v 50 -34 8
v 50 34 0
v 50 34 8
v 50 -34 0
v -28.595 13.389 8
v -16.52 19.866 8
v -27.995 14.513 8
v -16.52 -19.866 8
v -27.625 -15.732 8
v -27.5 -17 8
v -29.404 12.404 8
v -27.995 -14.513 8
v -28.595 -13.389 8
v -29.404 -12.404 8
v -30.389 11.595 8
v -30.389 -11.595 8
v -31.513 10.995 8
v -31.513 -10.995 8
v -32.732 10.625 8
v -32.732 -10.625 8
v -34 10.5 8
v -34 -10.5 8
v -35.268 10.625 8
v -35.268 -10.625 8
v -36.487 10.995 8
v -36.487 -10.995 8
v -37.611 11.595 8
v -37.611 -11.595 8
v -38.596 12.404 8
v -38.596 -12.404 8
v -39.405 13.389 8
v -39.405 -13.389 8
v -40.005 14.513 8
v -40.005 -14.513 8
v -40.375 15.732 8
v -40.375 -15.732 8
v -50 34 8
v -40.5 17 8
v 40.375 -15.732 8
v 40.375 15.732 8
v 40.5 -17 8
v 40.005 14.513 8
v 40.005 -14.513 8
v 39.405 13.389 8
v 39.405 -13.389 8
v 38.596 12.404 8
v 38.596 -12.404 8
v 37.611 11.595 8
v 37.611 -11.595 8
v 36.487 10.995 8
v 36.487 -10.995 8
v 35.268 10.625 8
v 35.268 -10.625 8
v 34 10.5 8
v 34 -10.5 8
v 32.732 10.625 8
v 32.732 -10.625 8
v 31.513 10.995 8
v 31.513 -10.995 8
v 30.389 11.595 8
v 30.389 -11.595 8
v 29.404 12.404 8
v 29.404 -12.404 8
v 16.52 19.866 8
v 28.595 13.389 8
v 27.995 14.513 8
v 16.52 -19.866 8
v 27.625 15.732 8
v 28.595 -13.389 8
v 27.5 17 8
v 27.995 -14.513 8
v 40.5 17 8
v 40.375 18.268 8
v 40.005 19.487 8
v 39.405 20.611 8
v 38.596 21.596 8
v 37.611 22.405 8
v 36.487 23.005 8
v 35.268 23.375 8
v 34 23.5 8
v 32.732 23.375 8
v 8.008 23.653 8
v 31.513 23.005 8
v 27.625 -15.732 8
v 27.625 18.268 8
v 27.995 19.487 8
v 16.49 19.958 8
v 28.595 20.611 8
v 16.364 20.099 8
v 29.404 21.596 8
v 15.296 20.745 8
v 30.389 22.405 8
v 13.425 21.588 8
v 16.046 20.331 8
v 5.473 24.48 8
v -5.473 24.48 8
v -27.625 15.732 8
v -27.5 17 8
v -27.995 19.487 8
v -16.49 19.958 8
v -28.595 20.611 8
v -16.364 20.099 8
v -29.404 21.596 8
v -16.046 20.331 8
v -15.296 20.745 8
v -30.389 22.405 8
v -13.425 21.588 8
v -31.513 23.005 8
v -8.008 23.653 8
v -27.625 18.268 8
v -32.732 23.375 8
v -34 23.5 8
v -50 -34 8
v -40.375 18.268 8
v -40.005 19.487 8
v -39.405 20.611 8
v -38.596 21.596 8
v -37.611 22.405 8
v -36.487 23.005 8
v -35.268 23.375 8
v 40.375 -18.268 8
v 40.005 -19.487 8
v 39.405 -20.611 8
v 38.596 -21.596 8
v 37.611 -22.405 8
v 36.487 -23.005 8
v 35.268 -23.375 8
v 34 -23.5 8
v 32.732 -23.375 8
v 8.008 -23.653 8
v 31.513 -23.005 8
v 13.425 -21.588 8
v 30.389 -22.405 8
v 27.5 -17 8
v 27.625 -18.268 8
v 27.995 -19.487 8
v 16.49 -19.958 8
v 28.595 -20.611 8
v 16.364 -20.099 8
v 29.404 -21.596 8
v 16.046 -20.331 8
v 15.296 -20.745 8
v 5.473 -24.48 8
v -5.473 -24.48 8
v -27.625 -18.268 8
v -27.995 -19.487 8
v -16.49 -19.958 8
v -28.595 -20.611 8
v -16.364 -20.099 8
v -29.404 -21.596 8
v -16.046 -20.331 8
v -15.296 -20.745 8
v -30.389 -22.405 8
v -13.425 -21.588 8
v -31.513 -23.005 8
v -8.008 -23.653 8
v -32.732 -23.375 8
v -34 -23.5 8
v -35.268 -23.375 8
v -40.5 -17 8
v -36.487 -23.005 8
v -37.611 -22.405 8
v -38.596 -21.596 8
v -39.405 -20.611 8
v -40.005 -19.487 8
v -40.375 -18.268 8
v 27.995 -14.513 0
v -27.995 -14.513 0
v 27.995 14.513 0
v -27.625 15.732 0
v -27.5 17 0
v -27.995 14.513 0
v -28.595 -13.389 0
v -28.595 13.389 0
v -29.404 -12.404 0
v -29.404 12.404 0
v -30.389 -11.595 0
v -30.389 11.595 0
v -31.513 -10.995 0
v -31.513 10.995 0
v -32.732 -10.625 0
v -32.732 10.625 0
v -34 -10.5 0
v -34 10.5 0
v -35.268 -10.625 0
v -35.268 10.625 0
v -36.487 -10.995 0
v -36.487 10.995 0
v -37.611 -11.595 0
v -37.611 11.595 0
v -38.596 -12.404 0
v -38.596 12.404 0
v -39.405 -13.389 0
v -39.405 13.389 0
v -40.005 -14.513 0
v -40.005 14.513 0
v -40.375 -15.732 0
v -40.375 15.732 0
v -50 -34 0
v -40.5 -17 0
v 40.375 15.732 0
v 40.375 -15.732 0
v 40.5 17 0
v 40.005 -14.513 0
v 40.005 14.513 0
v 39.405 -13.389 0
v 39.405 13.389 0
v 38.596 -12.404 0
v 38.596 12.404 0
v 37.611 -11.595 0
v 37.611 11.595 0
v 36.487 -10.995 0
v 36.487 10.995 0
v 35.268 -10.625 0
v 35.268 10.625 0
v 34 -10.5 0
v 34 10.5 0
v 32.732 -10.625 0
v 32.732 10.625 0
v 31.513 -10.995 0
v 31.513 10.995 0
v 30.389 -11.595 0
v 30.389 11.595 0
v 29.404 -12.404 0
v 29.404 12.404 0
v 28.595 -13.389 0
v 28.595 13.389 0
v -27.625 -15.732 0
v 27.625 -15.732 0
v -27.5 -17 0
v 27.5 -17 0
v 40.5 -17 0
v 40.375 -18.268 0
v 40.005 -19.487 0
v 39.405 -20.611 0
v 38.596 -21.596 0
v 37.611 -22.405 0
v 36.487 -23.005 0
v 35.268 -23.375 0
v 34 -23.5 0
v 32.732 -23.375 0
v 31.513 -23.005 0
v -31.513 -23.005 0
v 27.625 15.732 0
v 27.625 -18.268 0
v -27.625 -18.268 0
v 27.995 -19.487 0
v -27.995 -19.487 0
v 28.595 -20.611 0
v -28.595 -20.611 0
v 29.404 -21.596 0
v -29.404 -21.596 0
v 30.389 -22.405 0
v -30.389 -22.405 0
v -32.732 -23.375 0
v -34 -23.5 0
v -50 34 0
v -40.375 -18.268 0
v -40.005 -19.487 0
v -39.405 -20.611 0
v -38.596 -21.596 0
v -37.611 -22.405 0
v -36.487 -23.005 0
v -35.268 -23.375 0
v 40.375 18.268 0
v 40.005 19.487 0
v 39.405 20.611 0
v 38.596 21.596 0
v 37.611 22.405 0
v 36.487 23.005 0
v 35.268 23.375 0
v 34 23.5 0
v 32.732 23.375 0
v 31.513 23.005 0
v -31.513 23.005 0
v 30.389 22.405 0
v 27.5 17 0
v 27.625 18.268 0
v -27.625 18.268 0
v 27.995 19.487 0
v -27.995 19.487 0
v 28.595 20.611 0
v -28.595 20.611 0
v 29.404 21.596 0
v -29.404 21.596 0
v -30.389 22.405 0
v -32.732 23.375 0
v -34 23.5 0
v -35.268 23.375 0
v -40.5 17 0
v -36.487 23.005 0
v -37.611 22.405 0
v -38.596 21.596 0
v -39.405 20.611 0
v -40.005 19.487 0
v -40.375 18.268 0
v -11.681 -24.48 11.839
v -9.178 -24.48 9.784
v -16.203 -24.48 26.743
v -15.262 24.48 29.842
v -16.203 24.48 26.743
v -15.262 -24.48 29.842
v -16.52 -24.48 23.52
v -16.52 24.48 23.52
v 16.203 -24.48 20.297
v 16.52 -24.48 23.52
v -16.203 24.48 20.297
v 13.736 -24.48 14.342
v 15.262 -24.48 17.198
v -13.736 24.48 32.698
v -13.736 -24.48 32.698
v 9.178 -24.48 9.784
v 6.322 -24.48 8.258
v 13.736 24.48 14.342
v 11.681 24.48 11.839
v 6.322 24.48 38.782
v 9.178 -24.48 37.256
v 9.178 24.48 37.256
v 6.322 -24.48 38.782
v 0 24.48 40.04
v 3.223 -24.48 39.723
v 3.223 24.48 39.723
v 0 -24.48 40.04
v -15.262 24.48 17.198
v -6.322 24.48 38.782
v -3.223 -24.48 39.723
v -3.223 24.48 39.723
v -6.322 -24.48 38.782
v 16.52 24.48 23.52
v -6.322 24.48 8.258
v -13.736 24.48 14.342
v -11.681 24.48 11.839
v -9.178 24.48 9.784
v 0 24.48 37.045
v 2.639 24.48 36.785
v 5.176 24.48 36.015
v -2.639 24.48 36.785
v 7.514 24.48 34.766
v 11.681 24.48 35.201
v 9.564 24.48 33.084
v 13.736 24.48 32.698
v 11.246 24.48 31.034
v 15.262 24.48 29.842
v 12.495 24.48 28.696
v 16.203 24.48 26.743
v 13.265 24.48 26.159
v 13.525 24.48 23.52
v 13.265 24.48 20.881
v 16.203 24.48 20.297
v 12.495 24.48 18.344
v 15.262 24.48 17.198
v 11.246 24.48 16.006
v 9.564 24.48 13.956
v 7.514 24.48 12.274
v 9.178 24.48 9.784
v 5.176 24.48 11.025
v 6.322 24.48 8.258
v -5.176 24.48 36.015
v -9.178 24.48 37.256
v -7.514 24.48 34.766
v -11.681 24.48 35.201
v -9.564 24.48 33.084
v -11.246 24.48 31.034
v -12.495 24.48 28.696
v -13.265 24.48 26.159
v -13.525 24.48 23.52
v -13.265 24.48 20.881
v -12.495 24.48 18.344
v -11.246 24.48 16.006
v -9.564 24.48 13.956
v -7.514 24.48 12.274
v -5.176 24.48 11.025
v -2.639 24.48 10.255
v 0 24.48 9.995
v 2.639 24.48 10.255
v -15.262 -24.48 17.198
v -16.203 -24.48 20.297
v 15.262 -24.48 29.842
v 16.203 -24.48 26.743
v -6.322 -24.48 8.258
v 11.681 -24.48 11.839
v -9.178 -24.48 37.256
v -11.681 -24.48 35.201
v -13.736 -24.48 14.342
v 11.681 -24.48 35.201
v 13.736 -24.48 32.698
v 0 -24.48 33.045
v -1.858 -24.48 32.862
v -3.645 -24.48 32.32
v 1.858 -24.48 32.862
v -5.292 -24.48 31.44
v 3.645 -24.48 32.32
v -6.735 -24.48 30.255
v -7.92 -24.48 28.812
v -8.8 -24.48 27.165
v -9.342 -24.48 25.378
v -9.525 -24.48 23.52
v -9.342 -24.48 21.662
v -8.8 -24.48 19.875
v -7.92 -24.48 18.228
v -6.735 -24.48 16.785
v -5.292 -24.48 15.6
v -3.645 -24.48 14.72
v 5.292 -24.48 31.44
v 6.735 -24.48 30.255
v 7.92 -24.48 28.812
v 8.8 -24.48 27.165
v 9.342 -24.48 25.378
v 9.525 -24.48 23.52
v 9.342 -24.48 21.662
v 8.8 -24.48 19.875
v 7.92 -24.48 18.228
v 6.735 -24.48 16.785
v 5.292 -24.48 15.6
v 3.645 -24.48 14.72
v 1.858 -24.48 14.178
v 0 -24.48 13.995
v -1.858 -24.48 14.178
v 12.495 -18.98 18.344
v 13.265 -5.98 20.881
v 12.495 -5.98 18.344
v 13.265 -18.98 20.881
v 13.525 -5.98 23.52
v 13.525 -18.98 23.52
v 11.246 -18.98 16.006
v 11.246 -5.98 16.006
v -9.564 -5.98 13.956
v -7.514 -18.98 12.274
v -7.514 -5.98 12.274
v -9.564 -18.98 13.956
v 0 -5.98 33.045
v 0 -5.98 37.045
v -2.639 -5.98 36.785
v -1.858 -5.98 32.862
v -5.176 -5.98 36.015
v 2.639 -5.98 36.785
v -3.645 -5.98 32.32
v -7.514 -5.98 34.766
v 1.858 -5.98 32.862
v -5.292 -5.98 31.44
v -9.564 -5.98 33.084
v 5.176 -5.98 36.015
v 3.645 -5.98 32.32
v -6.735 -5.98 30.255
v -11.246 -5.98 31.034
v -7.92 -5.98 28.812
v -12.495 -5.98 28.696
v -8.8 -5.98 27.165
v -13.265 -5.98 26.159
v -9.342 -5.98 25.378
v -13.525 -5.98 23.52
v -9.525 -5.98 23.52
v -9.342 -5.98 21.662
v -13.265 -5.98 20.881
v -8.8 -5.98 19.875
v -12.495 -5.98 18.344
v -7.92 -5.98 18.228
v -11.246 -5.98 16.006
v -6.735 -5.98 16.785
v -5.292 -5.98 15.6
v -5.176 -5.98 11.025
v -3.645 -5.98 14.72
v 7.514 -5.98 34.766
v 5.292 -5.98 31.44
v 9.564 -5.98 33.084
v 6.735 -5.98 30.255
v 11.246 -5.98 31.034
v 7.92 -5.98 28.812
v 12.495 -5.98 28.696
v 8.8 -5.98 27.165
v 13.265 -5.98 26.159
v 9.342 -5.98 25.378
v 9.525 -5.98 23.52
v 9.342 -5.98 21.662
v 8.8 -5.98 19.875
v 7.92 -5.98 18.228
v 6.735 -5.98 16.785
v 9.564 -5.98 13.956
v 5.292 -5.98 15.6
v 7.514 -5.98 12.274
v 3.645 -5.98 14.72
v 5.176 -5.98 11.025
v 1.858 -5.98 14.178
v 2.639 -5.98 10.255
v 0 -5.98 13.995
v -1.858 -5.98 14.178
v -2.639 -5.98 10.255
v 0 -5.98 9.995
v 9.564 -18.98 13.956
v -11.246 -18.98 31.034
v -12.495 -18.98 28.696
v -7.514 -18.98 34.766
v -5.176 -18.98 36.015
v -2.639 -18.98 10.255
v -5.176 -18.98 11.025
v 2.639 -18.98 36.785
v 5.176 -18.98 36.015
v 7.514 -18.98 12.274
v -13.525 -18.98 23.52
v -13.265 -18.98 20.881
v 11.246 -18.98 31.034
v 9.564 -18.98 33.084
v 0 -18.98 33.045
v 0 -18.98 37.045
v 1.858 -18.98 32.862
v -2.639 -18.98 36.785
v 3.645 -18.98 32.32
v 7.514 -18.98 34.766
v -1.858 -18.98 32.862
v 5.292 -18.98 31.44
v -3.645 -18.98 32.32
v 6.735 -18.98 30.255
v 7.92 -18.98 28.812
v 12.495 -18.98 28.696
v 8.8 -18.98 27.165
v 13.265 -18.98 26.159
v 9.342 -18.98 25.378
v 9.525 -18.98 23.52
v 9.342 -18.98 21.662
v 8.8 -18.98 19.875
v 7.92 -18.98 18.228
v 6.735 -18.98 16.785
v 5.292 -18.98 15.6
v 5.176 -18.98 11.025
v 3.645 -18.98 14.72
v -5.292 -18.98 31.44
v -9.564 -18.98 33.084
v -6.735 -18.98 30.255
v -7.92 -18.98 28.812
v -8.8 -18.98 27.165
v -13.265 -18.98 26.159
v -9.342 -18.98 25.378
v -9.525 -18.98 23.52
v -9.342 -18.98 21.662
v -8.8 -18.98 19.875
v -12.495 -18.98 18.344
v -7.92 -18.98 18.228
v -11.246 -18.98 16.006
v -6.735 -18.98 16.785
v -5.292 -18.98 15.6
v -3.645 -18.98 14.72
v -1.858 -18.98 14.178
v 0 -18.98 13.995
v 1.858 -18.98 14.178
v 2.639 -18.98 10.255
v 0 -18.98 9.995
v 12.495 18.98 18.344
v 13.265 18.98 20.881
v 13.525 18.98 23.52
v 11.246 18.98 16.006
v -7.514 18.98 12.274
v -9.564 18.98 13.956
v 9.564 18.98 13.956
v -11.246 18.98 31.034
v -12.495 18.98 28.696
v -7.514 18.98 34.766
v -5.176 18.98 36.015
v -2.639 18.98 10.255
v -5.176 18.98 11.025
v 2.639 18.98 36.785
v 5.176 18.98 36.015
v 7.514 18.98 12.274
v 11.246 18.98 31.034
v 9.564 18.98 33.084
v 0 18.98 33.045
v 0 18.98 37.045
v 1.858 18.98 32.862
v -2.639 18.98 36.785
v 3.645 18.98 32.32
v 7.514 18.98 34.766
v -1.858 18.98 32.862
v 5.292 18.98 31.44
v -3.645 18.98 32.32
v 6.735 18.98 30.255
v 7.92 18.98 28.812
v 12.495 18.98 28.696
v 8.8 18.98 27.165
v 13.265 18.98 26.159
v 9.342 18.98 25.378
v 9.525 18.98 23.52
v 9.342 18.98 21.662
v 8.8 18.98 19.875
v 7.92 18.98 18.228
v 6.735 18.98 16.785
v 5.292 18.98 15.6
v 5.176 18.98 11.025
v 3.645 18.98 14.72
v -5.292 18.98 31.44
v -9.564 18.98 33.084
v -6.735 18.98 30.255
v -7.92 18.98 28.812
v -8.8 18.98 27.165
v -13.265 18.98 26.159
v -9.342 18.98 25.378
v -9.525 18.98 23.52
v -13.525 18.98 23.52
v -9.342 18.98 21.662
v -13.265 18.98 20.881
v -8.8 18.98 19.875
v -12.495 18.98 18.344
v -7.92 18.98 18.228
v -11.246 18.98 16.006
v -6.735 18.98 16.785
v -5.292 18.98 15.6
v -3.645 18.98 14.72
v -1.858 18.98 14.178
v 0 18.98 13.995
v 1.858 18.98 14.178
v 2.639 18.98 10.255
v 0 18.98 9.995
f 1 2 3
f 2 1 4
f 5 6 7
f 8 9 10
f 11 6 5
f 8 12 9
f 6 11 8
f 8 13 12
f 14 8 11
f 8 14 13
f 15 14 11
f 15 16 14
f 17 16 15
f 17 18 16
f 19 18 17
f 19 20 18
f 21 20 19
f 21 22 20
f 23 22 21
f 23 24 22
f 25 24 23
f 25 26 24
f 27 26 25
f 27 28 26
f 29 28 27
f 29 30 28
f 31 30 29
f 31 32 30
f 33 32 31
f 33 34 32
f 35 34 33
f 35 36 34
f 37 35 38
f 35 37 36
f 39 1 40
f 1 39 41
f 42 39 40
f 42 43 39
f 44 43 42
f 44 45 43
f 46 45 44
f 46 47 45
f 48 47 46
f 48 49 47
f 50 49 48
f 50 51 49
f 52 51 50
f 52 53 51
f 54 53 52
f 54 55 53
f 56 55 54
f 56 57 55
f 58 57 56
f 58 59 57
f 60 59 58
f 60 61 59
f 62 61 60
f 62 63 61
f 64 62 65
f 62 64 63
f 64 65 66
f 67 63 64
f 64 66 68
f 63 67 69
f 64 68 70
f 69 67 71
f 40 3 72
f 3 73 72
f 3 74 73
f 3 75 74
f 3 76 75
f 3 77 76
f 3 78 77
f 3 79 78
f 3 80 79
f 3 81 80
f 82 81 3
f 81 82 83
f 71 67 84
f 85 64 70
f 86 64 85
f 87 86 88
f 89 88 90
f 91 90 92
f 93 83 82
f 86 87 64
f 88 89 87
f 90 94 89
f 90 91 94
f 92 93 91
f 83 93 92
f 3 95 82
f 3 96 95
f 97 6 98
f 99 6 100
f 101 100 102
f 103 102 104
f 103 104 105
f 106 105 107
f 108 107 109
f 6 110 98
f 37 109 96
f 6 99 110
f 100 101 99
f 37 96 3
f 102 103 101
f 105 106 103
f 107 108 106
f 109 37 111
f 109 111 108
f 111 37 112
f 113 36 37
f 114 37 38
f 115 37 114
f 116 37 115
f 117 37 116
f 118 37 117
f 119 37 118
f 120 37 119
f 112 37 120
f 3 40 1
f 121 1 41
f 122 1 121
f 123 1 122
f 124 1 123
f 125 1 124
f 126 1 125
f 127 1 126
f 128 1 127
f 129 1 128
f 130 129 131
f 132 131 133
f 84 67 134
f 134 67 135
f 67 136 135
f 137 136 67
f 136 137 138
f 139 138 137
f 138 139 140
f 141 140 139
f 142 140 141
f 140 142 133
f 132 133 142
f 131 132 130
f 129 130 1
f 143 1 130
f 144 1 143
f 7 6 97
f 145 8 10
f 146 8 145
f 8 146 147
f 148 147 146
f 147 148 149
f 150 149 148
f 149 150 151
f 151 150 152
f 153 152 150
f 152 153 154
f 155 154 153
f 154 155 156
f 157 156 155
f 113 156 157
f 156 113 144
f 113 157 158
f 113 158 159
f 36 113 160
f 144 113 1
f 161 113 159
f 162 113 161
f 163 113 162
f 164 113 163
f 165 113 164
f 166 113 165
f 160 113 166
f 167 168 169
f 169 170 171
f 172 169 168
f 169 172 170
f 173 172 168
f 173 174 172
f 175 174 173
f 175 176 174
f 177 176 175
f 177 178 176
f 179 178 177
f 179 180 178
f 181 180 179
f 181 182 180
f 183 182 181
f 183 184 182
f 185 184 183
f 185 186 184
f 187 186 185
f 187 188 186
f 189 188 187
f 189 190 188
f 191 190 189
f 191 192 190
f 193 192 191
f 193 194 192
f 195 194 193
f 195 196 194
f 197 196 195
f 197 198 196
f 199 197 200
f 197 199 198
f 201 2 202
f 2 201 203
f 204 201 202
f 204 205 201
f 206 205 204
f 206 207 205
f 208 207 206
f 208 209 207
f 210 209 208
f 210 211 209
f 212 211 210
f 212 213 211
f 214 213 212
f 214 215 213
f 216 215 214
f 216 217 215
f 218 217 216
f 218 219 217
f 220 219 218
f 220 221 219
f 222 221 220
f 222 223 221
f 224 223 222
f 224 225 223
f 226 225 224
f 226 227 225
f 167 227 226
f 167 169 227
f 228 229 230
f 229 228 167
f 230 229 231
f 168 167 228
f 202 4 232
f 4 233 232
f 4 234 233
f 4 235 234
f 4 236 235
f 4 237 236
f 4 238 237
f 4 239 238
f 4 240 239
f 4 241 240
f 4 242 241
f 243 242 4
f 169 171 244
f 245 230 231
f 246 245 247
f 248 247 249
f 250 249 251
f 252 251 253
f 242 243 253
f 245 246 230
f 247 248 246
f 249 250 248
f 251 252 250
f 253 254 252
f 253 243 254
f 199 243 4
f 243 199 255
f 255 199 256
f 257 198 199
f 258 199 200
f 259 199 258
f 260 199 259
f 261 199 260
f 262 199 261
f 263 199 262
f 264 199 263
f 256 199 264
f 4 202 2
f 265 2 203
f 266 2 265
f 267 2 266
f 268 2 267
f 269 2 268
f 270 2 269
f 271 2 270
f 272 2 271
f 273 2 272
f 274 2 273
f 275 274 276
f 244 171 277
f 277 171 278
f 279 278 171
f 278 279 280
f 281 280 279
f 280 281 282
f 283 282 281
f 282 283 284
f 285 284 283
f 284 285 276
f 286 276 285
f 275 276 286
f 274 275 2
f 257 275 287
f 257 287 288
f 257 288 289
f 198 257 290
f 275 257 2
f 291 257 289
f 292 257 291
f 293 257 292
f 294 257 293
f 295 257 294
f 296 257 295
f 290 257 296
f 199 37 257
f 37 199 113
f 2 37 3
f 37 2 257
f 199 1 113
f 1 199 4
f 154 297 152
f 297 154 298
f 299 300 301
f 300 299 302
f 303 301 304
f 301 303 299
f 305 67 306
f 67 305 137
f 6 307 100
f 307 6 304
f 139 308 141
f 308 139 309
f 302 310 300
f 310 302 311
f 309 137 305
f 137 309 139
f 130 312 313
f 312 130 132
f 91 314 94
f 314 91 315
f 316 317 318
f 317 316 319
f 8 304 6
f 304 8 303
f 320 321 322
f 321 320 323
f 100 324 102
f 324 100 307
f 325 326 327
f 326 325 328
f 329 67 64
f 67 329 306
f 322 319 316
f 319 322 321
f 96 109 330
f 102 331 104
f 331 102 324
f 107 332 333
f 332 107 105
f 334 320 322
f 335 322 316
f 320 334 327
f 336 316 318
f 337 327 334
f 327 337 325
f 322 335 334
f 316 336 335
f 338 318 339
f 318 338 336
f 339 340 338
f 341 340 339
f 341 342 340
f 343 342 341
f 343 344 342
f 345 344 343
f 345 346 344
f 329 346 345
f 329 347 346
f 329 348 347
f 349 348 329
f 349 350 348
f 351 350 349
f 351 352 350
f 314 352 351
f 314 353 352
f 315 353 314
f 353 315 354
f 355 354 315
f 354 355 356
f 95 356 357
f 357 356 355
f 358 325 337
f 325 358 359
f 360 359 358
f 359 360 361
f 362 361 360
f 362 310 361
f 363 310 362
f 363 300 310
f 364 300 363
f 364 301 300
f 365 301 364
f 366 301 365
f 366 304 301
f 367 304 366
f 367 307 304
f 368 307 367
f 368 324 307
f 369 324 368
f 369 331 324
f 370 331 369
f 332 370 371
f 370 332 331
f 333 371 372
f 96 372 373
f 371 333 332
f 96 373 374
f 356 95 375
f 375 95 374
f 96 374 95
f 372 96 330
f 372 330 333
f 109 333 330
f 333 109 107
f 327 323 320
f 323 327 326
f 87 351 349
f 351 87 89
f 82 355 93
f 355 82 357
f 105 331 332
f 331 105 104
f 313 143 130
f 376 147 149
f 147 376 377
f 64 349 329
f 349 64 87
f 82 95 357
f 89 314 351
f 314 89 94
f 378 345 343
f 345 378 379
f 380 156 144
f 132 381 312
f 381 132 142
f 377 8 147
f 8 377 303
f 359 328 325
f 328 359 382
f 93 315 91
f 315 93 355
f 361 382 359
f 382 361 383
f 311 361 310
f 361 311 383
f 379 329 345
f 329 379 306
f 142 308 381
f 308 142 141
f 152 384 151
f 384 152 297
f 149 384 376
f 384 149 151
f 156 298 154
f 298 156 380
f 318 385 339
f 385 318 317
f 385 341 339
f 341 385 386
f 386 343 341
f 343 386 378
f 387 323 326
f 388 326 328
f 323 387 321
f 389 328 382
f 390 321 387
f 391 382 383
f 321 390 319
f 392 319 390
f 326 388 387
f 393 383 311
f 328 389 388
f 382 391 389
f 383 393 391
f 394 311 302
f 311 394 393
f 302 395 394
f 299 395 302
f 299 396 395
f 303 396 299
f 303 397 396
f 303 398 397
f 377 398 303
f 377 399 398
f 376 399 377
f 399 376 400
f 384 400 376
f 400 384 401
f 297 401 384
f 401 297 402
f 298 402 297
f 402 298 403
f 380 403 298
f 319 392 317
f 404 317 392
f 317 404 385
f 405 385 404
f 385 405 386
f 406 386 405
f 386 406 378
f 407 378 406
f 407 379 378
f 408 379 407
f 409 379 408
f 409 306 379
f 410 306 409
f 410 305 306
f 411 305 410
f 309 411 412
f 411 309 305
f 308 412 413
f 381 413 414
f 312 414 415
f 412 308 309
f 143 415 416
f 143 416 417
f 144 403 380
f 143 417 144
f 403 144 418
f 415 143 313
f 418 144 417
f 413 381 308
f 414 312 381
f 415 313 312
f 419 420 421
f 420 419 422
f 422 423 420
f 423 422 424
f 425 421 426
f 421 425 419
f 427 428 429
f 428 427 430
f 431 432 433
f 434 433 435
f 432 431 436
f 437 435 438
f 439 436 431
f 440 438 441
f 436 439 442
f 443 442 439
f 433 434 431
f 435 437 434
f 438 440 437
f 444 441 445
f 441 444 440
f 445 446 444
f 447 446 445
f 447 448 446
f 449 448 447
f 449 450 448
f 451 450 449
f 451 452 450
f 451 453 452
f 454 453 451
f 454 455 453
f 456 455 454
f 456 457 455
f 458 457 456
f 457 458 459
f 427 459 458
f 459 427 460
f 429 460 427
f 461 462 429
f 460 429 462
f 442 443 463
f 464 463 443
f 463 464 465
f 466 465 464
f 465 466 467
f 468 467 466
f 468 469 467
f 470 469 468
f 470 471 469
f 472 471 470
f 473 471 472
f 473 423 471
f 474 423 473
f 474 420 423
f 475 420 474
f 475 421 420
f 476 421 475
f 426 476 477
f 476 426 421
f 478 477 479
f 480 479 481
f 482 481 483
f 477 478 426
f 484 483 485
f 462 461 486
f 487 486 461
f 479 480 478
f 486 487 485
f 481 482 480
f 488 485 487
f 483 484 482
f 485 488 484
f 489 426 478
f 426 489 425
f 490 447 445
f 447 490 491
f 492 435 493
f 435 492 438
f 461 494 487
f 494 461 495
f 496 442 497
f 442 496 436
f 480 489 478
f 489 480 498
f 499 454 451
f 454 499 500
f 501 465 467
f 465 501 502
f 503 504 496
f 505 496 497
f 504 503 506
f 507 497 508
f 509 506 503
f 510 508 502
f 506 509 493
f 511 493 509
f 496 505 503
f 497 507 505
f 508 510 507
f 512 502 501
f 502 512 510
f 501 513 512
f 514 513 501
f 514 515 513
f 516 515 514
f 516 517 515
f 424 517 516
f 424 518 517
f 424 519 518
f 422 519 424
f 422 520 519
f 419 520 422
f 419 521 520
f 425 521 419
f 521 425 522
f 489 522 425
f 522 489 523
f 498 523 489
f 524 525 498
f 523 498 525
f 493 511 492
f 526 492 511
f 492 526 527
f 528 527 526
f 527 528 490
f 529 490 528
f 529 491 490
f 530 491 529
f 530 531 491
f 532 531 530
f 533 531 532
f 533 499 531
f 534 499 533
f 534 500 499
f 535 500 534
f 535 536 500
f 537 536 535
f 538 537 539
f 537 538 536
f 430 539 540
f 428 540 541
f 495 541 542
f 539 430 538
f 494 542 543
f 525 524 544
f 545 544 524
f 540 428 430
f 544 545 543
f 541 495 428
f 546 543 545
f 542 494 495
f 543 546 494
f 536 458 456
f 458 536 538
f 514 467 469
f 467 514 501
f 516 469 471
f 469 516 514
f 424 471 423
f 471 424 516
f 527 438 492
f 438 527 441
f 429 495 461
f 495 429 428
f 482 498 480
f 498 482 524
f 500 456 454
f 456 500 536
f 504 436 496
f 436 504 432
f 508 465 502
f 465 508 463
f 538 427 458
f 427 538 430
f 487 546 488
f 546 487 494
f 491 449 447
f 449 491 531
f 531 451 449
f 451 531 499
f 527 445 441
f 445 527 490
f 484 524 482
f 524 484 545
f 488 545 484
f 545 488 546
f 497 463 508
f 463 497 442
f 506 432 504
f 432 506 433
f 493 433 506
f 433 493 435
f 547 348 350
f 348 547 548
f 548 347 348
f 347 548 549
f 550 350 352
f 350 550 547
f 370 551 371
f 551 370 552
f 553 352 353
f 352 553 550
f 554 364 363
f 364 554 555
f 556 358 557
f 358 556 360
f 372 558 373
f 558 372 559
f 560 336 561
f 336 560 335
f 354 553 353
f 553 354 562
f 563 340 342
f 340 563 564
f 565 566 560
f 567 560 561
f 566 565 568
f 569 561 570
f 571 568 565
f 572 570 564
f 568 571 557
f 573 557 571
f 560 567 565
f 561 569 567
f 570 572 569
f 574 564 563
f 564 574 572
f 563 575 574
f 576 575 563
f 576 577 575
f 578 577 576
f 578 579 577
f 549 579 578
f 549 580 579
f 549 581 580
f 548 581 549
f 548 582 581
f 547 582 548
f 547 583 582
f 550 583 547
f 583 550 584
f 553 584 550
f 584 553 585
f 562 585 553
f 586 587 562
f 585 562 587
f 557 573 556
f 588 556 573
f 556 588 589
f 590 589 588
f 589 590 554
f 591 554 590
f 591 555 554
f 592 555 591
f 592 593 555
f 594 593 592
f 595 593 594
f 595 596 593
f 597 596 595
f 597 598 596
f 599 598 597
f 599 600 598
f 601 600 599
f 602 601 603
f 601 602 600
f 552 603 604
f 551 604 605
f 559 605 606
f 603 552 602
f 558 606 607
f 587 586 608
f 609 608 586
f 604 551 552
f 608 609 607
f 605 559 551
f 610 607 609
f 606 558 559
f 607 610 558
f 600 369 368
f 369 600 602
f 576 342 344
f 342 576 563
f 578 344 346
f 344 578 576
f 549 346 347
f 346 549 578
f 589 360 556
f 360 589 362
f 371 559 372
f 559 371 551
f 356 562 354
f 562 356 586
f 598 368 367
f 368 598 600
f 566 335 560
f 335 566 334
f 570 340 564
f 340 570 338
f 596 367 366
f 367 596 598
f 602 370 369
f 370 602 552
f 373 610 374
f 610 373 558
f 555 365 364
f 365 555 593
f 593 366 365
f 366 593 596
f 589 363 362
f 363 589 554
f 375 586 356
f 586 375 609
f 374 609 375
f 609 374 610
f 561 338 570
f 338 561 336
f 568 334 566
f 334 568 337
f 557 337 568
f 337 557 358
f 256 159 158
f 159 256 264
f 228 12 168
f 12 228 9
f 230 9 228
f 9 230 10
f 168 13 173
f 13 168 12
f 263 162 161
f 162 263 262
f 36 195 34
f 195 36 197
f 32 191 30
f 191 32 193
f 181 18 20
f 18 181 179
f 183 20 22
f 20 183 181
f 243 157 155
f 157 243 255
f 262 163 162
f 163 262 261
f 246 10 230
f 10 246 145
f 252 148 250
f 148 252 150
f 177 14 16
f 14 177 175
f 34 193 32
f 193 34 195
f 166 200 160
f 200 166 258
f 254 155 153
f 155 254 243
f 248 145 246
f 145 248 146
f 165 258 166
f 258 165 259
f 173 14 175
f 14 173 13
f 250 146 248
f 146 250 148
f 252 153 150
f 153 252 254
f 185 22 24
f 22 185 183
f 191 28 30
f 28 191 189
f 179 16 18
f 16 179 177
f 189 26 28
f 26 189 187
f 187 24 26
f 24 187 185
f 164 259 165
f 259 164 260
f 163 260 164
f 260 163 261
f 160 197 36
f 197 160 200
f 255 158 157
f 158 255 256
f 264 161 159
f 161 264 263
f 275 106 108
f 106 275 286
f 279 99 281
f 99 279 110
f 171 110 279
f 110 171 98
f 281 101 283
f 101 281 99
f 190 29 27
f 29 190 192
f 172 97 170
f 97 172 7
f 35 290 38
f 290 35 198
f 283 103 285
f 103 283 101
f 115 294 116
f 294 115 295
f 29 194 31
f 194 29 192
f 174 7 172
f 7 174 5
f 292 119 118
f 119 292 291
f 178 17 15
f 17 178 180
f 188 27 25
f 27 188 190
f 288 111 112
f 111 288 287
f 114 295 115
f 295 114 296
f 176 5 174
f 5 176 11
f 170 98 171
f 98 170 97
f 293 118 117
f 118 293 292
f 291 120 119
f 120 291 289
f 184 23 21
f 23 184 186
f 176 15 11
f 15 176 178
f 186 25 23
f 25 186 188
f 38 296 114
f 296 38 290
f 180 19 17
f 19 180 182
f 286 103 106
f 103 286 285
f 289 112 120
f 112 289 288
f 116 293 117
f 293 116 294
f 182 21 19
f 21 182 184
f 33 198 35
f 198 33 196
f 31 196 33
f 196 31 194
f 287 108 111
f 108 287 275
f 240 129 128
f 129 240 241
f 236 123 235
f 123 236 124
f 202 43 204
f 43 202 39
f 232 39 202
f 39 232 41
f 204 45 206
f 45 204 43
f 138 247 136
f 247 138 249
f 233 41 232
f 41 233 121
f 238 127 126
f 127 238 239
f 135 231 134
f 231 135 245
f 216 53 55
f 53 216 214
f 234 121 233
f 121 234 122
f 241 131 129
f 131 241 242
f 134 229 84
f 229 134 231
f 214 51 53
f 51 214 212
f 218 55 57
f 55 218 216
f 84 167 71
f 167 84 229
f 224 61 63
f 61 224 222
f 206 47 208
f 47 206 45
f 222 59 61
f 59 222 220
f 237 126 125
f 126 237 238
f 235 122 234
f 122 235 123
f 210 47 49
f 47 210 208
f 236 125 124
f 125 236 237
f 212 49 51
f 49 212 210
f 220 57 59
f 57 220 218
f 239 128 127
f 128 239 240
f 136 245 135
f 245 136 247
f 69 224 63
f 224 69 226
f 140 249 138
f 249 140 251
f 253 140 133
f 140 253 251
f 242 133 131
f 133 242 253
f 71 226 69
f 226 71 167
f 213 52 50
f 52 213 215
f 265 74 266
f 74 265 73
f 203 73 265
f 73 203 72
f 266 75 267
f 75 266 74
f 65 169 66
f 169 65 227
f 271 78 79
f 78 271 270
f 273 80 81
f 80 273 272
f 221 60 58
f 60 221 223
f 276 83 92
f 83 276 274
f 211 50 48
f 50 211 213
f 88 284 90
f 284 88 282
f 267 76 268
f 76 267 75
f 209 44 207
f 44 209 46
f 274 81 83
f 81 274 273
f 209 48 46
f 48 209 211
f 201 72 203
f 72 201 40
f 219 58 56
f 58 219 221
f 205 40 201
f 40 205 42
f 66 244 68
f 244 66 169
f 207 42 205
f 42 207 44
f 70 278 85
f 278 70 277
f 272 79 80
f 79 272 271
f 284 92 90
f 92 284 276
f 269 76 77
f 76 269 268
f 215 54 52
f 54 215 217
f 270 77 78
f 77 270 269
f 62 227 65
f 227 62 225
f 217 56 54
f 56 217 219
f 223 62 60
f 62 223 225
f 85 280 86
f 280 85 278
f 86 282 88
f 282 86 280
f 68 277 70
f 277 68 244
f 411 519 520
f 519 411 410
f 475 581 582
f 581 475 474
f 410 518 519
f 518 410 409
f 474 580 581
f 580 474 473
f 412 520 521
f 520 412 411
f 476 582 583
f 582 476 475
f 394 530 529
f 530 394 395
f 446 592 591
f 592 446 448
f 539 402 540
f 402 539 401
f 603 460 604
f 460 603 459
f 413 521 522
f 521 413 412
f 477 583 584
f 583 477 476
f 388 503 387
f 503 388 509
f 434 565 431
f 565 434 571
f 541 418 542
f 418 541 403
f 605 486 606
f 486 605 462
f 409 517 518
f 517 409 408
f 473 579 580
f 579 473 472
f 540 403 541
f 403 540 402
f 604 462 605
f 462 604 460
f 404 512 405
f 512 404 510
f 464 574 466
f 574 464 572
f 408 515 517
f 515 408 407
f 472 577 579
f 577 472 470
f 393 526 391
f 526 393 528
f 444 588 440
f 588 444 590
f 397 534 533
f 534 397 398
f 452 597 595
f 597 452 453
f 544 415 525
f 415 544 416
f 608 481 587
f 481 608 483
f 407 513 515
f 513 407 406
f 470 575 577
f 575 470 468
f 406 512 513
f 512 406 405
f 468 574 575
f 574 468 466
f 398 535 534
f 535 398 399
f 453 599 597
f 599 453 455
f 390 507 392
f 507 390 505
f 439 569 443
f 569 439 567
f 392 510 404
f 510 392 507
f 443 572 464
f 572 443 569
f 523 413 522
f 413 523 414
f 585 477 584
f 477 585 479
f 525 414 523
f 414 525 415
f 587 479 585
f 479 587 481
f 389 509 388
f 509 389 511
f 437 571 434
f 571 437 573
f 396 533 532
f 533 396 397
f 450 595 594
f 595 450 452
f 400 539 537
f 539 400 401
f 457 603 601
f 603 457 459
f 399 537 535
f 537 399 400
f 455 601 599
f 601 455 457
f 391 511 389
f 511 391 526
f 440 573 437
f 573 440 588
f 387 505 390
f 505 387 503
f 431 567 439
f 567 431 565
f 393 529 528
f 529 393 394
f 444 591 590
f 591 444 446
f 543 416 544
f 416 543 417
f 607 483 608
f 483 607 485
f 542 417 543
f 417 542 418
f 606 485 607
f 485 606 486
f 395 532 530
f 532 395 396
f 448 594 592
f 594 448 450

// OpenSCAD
$fn = 32;

// ----------------------------------------------------------------------
// Bearing block: 100 x 68 mm base, 19.05 mm bore at 23.52 mm
// ----------------------------------------------------------------------

// --- parameters (mm) ---
base_w = 100;             // base width
base_d = 68;              // base depth
base_t = 8;               // base thickness
bore_d = 19.05;           // shaft / bearing bore
house_r = 16.52;          // housing outer radius
house_len = 48.96;        // housing length along the shaft
foot_w = 33.04;           // foot width under the housing
foot_len = 38.96;         // foot length along the shaft
axis_z = 23.52;           // bore axis height above the base
holes_d = 13;             // mounting holes
hole_x = 34;              // mounting hole spacing
seat_d = 8;               // bearing seat depth
seat_wall = 4;            // seat wall thickness

difference() {
  union() {
    /* base plate with its underside on z = 0 */
    translate([0, 0, base_t / 2]) cube([base_w, base_d, base_t], center = true);
    /* hull foot: a straight web blending into the round housing */
    hull() {
      translate([0, 0, base_t - 0.5]) cube([foot_w, foot_len, 1.6], center = true);
      translate([0, 0, axis_z]) rotate([-90, 0, 0]) cylinder(h = house_len, d = 2 * house_r, center = true);
    }
  }
  /* bore through the housing, 2.5 mm clear on both sides */
  translate([0, 0, axis_z]) rotate([-90, 0, 0]) cylinder(h = house_len + 5, d = bore_d, center = true);
  /* bearing seats, recessed into both ends of the housing */
  for (sy = [-1, 1]) {
    translate([0, sy * (house_len / 2 - seat_d + 2.5), axis_z]) rotate([-90, 0, 0]) cylinder(h = seat_d + 5, d = bore_d + 2 * seat_wall);
  }
  /* mounting holes through the base plate */
  for (hx = [-34, 34]) {
    for (hy = [-17, 17]) {
      translate([hx, hy, -2.5]) cylinder(h = base_t + 5, d = holes_d);
    }
  }
}
